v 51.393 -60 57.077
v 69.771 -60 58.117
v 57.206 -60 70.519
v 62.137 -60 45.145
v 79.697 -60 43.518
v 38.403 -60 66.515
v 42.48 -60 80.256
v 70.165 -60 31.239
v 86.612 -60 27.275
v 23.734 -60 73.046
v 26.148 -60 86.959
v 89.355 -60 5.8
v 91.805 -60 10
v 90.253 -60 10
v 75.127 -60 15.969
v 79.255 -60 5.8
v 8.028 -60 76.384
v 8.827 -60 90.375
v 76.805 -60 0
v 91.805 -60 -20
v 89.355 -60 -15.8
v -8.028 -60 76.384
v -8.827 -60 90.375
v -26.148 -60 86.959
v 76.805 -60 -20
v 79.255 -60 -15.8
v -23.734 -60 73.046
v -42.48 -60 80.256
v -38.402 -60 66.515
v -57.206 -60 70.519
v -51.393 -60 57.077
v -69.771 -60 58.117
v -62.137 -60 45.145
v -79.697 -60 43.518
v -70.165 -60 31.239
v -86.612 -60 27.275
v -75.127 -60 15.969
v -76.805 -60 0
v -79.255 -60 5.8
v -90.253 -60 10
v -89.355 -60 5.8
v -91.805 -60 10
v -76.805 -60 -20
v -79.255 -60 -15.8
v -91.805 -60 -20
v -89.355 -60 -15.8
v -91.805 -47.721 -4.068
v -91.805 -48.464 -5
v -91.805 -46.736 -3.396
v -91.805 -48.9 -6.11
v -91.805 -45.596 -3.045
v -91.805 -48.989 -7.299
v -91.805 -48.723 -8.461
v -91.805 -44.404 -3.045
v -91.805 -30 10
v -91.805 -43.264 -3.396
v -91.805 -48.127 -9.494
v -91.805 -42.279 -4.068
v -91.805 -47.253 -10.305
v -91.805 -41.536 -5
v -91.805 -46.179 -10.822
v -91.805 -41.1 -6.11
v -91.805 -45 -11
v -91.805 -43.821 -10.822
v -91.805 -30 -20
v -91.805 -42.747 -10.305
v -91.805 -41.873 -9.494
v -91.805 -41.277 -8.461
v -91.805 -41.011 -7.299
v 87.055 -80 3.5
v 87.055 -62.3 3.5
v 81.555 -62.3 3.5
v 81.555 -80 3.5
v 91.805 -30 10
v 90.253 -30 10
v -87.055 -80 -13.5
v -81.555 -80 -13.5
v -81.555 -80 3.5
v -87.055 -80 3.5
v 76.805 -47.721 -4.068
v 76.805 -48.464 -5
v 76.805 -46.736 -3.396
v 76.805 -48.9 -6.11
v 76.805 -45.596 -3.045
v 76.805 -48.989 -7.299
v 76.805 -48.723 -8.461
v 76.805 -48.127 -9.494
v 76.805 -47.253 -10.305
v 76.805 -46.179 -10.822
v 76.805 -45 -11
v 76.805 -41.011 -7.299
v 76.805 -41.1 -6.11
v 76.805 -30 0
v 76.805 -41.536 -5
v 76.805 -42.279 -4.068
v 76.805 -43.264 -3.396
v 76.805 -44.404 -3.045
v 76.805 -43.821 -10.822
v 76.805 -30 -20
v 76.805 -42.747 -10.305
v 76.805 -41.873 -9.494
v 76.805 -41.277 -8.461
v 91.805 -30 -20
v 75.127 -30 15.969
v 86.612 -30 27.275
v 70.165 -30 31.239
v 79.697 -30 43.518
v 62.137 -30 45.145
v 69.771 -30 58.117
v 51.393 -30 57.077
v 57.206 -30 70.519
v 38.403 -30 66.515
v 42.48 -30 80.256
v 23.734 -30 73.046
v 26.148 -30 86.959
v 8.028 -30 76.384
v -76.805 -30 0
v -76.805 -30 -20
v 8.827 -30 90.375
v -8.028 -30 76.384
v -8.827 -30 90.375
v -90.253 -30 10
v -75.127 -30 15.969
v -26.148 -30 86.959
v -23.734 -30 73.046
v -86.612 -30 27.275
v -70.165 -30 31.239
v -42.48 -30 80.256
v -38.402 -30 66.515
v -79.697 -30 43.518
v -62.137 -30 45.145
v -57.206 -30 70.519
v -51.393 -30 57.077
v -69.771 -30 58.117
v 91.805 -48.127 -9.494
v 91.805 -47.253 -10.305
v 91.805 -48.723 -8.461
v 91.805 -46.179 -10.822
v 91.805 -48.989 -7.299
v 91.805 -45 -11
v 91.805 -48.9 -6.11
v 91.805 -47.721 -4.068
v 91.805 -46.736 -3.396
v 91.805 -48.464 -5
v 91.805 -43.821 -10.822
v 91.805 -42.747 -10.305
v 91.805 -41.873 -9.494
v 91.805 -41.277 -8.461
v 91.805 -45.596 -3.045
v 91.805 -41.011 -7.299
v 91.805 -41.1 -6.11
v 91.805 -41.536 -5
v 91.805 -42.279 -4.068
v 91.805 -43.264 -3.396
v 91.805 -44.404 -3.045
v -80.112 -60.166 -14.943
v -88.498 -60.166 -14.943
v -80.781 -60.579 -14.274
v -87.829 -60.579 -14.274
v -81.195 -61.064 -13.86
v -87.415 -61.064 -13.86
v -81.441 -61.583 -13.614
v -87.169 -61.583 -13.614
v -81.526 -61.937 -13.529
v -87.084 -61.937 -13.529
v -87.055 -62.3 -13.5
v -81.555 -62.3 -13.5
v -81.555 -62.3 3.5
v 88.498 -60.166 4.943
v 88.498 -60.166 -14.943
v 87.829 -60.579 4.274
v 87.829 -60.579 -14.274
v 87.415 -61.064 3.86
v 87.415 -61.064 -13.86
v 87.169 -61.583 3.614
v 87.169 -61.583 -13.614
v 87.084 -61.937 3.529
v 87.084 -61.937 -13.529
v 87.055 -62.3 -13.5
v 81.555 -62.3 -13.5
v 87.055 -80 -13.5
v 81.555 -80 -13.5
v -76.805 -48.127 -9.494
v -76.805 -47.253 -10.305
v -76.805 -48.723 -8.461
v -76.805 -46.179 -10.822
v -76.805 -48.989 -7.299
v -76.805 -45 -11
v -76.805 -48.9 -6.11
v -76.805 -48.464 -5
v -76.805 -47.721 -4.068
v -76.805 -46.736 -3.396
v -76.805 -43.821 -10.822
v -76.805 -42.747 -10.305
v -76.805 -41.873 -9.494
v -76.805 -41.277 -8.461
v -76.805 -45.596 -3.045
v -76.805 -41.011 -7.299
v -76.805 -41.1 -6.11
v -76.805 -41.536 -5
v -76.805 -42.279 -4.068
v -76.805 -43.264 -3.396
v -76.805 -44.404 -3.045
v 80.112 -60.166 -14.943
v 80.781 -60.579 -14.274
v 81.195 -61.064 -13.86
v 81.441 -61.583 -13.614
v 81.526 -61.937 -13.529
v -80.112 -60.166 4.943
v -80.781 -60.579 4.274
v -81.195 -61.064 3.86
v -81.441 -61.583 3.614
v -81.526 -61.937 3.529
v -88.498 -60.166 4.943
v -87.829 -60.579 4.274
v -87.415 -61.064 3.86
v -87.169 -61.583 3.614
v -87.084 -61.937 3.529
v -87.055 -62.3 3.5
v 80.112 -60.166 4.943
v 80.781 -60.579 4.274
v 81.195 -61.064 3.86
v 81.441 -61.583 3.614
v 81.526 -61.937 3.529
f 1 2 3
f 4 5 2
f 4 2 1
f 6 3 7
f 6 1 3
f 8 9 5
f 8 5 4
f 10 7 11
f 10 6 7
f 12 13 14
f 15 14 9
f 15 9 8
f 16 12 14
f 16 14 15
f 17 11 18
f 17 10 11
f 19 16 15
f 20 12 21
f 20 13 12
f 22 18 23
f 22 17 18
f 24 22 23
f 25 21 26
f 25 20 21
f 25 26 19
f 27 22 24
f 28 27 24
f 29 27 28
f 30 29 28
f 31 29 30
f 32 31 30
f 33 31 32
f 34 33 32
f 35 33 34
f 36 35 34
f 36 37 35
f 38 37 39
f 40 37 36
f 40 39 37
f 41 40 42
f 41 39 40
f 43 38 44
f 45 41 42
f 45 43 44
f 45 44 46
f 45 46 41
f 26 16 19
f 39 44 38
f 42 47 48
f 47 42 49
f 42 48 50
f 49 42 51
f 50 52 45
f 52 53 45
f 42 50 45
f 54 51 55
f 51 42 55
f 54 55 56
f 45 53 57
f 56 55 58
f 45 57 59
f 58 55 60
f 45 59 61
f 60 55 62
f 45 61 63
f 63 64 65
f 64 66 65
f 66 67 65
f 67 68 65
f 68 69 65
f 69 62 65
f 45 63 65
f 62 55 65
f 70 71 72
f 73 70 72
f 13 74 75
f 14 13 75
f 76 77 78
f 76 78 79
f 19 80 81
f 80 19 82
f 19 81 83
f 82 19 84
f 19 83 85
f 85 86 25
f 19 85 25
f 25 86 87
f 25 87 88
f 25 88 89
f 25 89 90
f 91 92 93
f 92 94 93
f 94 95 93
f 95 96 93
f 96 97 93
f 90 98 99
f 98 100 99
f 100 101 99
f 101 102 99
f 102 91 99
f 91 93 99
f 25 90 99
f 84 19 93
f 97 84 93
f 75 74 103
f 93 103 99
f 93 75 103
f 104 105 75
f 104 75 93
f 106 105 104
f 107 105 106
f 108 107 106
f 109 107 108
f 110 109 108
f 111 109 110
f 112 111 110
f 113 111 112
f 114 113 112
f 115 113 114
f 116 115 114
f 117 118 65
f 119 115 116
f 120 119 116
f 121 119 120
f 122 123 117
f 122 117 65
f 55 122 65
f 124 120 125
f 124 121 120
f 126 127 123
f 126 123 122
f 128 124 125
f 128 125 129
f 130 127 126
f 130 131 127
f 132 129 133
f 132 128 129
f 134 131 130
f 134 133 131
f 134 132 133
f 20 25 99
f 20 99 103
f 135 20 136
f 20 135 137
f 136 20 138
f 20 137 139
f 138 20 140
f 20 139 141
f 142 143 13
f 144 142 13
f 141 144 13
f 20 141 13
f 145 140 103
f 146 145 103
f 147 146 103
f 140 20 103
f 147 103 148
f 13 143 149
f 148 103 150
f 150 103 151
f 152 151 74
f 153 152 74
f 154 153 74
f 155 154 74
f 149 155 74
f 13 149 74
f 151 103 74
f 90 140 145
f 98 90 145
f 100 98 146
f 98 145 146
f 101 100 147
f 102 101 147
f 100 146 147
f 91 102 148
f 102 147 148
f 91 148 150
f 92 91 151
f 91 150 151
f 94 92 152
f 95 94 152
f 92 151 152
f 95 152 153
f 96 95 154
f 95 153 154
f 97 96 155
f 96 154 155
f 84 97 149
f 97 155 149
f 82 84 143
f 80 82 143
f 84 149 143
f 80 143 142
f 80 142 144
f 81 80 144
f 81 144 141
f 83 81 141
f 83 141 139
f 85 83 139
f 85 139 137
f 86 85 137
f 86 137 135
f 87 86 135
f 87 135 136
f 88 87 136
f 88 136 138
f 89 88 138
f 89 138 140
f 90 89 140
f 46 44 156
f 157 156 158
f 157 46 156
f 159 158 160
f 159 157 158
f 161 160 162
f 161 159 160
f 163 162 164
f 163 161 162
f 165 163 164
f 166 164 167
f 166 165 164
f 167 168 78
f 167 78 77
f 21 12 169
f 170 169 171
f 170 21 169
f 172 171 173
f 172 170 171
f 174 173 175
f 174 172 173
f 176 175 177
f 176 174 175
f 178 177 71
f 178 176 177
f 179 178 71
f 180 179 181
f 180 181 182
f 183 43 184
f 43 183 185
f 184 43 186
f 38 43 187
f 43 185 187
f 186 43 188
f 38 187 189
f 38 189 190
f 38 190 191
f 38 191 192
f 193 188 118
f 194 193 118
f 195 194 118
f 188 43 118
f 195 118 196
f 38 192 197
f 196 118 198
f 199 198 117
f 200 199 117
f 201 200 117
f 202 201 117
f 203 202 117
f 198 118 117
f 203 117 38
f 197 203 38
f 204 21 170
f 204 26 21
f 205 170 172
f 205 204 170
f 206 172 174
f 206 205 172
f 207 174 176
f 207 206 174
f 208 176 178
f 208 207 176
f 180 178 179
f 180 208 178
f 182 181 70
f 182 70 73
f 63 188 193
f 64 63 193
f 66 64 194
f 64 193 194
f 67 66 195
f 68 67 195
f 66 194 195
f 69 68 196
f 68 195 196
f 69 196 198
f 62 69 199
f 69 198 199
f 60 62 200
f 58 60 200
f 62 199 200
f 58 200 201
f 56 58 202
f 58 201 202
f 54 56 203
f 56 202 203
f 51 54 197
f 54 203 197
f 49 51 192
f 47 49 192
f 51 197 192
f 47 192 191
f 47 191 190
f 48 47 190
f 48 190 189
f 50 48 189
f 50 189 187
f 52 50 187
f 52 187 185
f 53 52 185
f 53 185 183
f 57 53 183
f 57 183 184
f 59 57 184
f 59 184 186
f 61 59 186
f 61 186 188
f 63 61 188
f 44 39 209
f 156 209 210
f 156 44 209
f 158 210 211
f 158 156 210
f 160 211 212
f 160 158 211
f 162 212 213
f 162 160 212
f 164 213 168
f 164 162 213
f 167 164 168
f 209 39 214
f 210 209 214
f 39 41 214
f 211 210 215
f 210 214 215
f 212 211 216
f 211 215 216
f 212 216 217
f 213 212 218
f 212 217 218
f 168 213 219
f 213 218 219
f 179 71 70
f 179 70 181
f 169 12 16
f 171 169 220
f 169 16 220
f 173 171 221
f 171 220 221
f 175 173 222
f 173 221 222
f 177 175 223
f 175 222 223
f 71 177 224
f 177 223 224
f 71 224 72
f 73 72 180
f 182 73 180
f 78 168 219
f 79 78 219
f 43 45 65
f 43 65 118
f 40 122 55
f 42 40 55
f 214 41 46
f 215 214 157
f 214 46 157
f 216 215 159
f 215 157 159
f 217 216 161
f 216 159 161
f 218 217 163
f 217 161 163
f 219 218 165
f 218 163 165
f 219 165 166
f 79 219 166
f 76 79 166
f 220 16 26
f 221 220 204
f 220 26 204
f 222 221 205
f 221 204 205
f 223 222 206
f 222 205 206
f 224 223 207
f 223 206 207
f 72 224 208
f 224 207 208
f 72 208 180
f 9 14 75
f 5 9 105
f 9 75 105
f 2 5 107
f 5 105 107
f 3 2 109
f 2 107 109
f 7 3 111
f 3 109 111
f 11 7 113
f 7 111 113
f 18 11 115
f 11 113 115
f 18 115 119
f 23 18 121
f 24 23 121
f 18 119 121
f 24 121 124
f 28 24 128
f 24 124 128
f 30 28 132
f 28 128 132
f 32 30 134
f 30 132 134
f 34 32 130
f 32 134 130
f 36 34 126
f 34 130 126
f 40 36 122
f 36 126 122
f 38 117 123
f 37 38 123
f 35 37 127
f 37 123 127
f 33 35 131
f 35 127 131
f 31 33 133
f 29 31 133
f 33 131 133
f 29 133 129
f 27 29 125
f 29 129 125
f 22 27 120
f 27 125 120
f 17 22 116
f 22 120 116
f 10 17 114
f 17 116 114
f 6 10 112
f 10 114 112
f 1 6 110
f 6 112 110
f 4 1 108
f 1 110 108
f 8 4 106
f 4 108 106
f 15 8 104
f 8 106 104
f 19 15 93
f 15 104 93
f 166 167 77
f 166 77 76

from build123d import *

# Parameters (mm, degrees)
BOSS_EXTRUDE1_DEPTH      = 60
SKETCH25_W               = 5.5
SKETCH25_H               = 17
BOSS_EXTRUDE3_DEPTH      = 20
FILLET1_R                = 2.3
CUT_EXTRUDE19_DEPTH      = 165.638713704
CUT_EXTRUDE19_DEPTH_BACK = 165.638713704
SKETCH30_W               = 183.61
SKETCH30_H               = 30
SKETCH31_R               = 4
CUT_EXTRUDE20_DEPTH      = 220.90493429


with BuildPart() as part:
    # Sketch1 → Boss-Extrude1 (new body)
    with BuildSketch(Plane(origin=(0, 0, 0), x_dir=(1, 0, 0), z_dir=(0, 1, 0))):
        with BuildLine():
            Line((91.805, -10), (90.252689849, -10))
            ThreePointArc((90.252689849, -10), (0, -90.805), (-90.252689849, -10))
            Line((-90.252689849, -10), (-91.805, -10))
            Line((-91.805, -10), (-91.805, 20))
            Line((-91.805, 20), (-76.805, 20))
            Line((-76.805, 20), (-76.805, 0))
            ThreePointArc((-76.805, 0), (0, -76.805), (76.805, 0))
            Line((76.805, 0), (76.805, 20))
            Line((76.805, 20), (91.805, 20))
            Line((91.805, 20), (91.805, -10))
        make_face()
    extrude(amount=-BOSS_EXTRUDE1_DEPTH)

    # Sketch25 → Boss-Extrude3 (add)
    with BuildSketch(Plane(origin=(0, -60, 0), x_dir=(-1, 0, 0), z_dir=(0, -1, 0))):
        with Locations((84.305, 5)):
            Rectangle(SKETCH25_W, SKETCH25_H)
        with Locations((-84.305, 5)):
            Rectangle(SKETCH25_W, SKETCH25_H)
    extrude(amount=BOSS_EXTRUDE3_DEPTH)

    # Fillet1
    fillet1_edges = [part.edges().sort_by_distance(p)[0] for p in [
        (84.305, -60, 3.5),
        (81.555, -60, -5),
        (87.055, -60, -5),
        (84.305, -60, -13.5),
        (-84.305, -60, 3.5),
        (-87.055, -60, -5),
        (-81.555, -60, -5),
        (-84.305, -60, -13.5),
    ]]
    fillet(fillet1_edges, radius=FILLET1_R)

    # Sketch30 → Cut-Extrude19 (cut, two sides: drawn at the far end of the back side and taken through both)
    with BuildSketch(Plane(origin=(0, 0, -20), x_dir=(-1, 0, 0), z_dir=(0, 0, -1)).offset(-CUT_EXTRUDE19_DEPTH_BACK)):
        with Locations((0, -15)):
            Rectangle(SKETCH30_W, SKETCH30_H)
    extrude(amount=CUT_EXTRUDE19_DEPTH + CUT_EXTRUDE19_DEPTH_BACK, mode=Mode.SUBTRACT)

    # Sketch31 → Cut-Extrude20 (cut, through all)
    with BuildSketch(Plane(origin=(91.805, 0, 0), x_dir=(0, 0, -1), z_dir=(1, 0, 0))):
        with Locations((7, -45)):
            Circle(SKETCH31_R)
    extrude(amount=-CUT_EXTRUDE20_DEPTH, mode=Mode.SUBTRACT)


solid = part.part
